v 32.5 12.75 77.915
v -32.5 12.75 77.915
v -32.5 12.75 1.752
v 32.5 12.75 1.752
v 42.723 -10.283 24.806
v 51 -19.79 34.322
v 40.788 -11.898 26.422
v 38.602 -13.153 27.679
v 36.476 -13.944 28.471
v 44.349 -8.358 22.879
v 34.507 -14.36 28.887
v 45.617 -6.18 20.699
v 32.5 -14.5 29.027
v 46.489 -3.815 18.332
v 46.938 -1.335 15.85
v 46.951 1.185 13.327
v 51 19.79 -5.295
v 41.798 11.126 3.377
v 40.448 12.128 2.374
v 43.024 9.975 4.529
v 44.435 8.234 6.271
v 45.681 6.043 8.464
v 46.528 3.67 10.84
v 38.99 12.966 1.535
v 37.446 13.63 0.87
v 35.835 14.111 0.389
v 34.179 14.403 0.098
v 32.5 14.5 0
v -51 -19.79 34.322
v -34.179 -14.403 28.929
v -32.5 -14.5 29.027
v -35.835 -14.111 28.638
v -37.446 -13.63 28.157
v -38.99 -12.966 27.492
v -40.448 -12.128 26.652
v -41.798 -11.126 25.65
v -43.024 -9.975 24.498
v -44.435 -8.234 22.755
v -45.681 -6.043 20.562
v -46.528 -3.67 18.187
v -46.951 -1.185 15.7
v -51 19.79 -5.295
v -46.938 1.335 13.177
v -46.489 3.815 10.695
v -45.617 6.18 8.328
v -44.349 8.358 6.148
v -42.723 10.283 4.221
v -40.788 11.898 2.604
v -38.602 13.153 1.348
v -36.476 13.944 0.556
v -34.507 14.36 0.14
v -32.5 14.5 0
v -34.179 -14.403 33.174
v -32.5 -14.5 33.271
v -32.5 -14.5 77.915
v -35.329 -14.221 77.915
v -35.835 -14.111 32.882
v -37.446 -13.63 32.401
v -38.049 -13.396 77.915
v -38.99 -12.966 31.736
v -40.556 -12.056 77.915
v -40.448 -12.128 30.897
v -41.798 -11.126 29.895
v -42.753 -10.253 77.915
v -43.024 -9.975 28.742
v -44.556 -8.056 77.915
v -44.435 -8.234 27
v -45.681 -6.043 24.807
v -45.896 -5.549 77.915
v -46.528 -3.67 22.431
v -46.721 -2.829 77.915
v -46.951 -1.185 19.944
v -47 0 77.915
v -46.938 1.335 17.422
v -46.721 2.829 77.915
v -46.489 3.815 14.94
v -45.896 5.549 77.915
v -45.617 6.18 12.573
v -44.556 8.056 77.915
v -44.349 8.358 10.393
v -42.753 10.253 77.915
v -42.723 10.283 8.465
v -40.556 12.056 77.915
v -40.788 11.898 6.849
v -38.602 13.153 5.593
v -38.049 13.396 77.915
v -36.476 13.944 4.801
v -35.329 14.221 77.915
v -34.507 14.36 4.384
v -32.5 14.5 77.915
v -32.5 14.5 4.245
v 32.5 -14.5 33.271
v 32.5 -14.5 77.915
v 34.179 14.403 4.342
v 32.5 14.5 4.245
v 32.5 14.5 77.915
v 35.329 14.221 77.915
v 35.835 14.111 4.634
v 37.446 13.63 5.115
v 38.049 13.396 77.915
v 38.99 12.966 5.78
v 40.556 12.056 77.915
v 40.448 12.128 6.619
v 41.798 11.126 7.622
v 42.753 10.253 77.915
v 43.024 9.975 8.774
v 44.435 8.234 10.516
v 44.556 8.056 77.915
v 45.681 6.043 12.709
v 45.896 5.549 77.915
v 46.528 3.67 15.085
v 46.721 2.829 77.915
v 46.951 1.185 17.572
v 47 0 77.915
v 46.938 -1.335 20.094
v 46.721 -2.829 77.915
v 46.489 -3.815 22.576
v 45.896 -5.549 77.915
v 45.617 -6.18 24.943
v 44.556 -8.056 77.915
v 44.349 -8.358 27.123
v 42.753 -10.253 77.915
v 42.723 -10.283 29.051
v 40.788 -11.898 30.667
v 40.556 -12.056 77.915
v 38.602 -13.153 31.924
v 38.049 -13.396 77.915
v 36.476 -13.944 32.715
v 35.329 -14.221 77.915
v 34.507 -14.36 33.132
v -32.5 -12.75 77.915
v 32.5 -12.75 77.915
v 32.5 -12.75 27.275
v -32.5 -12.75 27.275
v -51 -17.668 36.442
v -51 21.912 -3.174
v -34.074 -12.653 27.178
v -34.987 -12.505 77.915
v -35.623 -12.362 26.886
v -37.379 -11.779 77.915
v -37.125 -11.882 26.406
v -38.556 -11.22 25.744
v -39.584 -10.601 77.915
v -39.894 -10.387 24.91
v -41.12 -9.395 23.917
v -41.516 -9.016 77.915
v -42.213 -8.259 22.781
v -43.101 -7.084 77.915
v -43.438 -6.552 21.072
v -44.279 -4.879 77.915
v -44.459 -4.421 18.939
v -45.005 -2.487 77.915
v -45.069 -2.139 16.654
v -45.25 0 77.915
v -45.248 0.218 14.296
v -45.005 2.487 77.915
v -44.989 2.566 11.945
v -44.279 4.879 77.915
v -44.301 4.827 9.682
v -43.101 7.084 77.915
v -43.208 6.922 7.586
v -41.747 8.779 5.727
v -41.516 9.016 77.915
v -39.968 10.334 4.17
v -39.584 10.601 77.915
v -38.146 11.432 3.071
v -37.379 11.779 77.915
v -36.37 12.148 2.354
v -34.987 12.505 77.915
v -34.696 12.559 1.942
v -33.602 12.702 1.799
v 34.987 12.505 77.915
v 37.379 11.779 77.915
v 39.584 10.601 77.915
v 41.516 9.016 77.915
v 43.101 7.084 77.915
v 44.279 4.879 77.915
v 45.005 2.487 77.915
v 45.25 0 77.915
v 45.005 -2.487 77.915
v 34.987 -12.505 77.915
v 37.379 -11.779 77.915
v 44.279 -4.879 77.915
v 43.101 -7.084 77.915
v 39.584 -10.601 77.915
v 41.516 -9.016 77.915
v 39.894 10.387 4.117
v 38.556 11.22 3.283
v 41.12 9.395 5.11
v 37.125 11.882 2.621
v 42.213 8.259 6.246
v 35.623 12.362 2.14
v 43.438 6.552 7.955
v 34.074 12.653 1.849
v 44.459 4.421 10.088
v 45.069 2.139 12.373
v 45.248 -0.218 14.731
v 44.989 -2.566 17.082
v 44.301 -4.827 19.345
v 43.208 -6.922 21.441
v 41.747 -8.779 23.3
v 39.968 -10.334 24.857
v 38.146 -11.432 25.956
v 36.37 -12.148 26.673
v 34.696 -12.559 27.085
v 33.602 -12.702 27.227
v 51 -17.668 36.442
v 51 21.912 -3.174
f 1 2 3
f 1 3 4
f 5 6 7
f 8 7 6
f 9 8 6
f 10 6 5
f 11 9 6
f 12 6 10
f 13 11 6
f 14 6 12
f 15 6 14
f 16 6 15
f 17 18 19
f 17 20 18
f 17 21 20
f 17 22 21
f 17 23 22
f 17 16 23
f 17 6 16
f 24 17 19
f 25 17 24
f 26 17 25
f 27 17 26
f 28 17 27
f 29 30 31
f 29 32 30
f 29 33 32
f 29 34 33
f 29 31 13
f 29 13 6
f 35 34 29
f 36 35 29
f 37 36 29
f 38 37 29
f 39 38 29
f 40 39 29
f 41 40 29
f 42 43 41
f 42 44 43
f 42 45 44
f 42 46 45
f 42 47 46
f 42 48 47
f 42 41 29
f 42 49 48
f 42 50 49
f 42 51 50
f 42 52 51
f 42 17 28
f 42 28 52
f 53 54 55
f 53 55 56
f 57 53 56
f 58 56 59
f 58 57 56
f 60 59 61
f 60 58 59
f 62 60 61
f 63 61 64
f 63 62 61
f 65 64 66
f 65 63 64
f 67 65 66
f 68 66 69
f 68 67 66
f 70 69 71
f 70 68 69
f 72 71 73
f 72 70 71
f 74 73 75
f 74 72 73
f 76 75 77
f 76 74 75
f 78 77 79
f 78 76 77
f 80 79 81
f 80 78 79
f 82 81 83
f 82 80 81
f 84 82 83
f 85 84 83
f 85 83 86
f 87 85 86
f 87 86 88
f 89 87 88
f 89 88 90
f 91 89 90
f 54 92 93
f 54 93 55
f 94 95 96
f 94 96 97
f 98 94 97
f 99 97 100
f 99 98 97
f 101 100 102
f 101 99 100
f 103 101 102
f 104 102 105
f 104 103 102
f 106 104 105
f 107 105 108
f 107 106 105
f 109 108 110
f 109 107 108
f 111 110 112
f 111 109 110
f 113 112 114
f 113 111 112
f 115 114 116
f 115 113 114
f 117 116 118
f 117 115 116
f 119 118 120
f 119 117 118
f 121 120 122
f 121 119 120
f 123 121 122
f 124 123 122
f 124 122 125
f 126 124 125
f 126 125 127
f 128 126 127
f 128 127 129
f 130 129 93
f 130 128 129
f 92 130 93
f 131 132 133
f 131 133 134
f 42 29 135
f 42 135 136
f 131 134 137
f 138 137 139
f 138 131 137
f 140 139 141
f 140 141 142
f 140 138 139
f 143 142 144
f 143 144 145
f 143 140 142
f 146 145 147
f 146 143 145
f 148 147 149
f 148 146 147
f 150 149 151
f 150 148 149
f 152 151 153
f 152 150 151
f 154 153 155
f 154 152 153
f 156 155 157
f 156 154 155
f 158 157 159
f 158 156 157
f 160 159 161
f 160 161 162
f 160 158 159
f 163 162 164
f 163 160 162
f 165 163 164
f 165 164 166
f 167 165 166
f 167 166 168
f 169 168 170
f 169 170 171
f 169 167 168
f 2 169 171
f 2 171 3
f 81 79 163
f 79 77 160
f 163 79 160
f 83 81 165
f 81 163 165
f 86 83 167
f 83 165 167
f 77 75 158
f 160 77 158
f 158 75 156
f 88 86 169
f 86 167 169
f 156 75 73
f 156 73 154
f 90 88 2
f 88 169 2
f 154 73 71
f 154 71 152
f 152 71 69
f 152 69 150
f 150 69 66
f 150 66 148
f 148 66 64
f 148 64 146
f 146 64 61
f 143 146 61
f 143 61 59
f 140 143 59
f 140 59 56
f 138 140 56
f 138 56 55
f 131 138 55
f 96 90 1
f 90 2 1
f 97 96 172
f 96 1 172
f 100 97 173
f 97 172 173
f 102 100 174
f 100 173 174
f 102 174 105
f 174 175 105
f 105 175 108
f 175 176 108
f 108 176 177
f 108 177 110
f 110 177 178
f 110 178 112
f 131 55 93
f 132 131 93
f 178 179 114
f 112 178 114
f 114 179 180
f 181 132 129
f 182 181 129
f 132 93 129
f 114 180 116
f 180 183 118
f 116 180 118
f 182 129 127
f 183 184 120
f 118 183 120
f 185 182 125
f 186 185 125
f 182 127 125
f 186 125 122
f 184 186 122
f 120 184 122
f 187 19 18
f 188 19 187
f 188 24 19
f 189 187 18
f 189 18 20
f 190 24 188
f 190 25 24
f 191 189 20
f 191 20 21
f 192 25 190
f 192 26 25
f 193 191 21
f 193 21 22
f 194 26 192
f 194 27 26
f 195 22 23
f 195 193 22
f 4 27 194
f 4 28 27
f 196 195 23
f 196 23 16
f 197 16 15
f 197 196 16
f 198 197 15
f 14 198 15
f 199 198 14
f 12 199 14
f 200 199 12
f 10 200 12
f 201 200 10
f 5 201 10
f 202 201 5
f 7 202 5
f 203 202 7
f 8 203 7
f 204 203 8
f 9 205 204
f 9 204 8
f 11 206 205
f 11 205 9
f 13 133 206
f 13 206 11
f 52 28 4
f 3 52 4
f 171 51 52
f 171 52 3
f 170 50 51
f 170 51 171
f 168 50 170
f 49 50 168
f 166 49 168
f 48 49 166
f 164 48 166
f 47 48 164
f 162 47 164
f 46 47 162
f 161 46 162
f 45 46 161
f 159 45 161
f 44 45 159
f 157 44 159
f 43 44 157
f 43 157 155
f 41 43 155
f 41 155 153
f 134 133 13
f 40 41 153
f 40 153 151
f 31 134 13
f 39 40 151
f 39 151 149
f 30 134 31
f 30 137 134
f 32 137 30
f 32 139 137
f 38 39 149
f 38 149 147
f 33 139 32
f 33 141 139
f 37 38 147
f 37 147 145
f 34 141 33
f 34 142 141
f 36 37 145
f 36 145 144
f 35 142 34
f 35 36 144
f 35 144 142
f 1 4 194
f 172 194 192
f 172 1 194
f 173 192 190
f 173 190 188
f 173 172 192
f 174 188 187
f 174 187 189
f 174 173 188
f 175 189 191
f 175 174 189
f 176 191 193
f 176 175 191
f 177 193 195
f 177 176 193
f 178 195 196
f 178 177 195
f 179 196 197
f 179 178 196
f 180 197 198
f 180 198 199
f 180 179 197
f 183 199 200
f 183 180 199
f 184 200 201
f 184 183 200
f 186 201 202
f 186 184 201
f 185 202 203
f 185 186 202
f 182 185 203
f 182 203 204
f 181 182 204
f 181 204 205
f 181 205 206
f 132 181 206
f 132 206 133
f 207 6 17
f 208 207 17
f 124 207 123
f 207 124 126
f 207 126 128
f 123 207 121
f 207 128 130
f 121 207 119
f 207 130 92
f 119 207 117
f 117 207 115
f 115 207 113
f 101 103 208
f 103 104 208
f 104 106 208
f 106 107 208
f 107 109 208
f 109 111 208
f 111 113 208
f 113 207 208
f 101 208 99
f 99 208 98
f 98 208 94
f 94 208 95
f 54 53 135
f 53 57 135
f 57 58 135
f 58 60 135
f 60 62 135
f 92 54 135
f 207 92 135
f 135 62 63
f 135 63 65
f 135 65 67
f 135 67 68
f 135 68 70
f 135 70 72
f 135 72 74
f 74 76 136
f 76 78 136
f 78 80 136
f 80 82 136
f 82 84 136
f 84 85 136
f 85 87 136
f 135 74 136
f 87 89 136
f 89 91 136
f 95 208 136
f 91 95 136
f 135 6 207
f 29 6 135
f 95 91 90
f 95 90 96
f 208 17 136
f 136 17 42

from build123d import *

# Parameters (mm, degrees)
BOSS_EXTRUDE12_DEPTH            = 80
CUT_EXTRUDE10_DEPTH             = 114.712356409
CUT_EXTRUDE10_DEPTH_BACK        = 114.712356409
SKETCH37_W                      = 102
SKETCH37_H                      = 56
BOSS_EXTRUDE16_DEPTH            = 3
CUT_EXTRUDE11_DEPTH             = 102.766059637
SKETCH40_W                      = 127.486838651
SKETCH40_H                      = 11.94281061
CUT_EXTRUDE12_DEPTH             = 102.007241851
CUT_EXTRUDE12_DIRECTION_2_REACH = 103.007


with BuildPart() as part:
    # Sketch22 → Boss-Extrude12 (new body)
    with BuildSketch(Plane.XY):
        with BuildLine():
            Line((32.5, -14.5), (-32.5, -14.5))
            ThreePointArc((-32.5, -14.5), (-47, 0), (-32.5, 14.5))
            Line((-32.5, 14.5), (32.5, 14.5))
            ThreePointArc((32.5, 14.5), (47, 0), (32.5, -14.5))
        make_face()
    extrude(amount=BOSS_EXTRUDE12_DEPTH)

    # Sketch35 → Cut-Extrude10 (cut, two sides: drawn at the far end of the back side and taken through both)
    with BuildSketch(Plane(origin=(-32.5, 0, 0), x_dir=(0, 0, -1), z_dir=(1, 0, 0)).offset(-CUT_EXTRUDE10_DEPTH_BACK)):
        Polygon((0, 14.5), (-29.026860374, -14.5), (0, -14.5), align=None)
    extrude(amount=CUT_EXTRUDE10_DEPTH + CUT_EXTRUDE10_DEPTH_BACK, mode=Mode.SUBTRACT)

    # Sketch37 → Boss-Extrude16 (add)
    with BuildSketch(Plane(origin=(0, 7.256711984, 7.249996893), x_dir=(-1, 0, 0), z_dir=(0, -0.7074340219640284, -0.7067793888957138))):
        with Locations((0, -10.26729429)):
            Rectangle(SKETCH37_W, SKETCH37_H)
    extrude(amount=-BOSS_EXTRUDE16_DEPTH)

    # Sketch38 → Cut-Extrude11 (cut, through all)
    with BuildSketch(Plane.XY.offset(80)):
        with BuildLine():
            Line((-32.5, 12.75), (32.5, 12.75))
            ThreePointArc((32.5, 12.75), (45.25, 0), (32.5, -12.75))
            Line((32.5, -12.75), (-32.5, -12.75))
            ThreePointArc((-32.5, -12.75), (-45.25, 0), (-32.5, 12.75))
        make_face()
    extrude(amount=-CUT_EXTRUDE11_DEPTH, mode=Mode.SUBTRACT)

    # Sketch40 → Cut-Extrude12 (cut)
    with BuildSketch(Plane(origin=(0, -12.75, 0), x_dir=(1, 0, 0), z_dir=(0, 1, 0))):
        with Locations((5.984726224, -83.886766037)):
            Rectangle(SKETCH40_W, SKETCH40_H)
    extrude(amount=CUT_EXTRUDE12_DEPTH, mode=Mode.SUBTRACT)

    # Cut-Extrude12 direction 2: up to this face of the body (flat: up to its plane)
    cut_extrude12_direction_2_end = Plane(part.part.faces().sort_by_distance((0, -14.5, 56.635733163))[0])
    # Sketch40 → Cut-Extrude12 direction 2 (cut, up to the picked face)
    with BuildSketch(Plane(origin=(0, -12.75, 0), x_dir=(1, 0, 0), z_dir=(0, 1, 0)), mode=Mode.PRIVATE) as cut_extrude12_direction_2_sk1:
        with Locations((5.984726224, -83.886766037)):
            Rectangle(SKETCH40_W, SKETCH40_H)
    cut_extrude12_direction_2_tool1 = split(extrude(cut_extrude12_direction_2_sk1.sketch, amount=-CUT_EXTRUDE12_DIRECTION_2_REACH, mode=Mode.PRIVATE), bisect_by=cut_extrude12_direction_2_end, keep=Keep.BOTH, mode=Mode.PRIVATE)
    add(cut_extrude12_direction_2_tool1.solids().sort_by(Axis((5.984726, -12.75, 83.886766), (0, -1, 0)))[0], mode=Mode.SUBTRACT)


solid = part.part
